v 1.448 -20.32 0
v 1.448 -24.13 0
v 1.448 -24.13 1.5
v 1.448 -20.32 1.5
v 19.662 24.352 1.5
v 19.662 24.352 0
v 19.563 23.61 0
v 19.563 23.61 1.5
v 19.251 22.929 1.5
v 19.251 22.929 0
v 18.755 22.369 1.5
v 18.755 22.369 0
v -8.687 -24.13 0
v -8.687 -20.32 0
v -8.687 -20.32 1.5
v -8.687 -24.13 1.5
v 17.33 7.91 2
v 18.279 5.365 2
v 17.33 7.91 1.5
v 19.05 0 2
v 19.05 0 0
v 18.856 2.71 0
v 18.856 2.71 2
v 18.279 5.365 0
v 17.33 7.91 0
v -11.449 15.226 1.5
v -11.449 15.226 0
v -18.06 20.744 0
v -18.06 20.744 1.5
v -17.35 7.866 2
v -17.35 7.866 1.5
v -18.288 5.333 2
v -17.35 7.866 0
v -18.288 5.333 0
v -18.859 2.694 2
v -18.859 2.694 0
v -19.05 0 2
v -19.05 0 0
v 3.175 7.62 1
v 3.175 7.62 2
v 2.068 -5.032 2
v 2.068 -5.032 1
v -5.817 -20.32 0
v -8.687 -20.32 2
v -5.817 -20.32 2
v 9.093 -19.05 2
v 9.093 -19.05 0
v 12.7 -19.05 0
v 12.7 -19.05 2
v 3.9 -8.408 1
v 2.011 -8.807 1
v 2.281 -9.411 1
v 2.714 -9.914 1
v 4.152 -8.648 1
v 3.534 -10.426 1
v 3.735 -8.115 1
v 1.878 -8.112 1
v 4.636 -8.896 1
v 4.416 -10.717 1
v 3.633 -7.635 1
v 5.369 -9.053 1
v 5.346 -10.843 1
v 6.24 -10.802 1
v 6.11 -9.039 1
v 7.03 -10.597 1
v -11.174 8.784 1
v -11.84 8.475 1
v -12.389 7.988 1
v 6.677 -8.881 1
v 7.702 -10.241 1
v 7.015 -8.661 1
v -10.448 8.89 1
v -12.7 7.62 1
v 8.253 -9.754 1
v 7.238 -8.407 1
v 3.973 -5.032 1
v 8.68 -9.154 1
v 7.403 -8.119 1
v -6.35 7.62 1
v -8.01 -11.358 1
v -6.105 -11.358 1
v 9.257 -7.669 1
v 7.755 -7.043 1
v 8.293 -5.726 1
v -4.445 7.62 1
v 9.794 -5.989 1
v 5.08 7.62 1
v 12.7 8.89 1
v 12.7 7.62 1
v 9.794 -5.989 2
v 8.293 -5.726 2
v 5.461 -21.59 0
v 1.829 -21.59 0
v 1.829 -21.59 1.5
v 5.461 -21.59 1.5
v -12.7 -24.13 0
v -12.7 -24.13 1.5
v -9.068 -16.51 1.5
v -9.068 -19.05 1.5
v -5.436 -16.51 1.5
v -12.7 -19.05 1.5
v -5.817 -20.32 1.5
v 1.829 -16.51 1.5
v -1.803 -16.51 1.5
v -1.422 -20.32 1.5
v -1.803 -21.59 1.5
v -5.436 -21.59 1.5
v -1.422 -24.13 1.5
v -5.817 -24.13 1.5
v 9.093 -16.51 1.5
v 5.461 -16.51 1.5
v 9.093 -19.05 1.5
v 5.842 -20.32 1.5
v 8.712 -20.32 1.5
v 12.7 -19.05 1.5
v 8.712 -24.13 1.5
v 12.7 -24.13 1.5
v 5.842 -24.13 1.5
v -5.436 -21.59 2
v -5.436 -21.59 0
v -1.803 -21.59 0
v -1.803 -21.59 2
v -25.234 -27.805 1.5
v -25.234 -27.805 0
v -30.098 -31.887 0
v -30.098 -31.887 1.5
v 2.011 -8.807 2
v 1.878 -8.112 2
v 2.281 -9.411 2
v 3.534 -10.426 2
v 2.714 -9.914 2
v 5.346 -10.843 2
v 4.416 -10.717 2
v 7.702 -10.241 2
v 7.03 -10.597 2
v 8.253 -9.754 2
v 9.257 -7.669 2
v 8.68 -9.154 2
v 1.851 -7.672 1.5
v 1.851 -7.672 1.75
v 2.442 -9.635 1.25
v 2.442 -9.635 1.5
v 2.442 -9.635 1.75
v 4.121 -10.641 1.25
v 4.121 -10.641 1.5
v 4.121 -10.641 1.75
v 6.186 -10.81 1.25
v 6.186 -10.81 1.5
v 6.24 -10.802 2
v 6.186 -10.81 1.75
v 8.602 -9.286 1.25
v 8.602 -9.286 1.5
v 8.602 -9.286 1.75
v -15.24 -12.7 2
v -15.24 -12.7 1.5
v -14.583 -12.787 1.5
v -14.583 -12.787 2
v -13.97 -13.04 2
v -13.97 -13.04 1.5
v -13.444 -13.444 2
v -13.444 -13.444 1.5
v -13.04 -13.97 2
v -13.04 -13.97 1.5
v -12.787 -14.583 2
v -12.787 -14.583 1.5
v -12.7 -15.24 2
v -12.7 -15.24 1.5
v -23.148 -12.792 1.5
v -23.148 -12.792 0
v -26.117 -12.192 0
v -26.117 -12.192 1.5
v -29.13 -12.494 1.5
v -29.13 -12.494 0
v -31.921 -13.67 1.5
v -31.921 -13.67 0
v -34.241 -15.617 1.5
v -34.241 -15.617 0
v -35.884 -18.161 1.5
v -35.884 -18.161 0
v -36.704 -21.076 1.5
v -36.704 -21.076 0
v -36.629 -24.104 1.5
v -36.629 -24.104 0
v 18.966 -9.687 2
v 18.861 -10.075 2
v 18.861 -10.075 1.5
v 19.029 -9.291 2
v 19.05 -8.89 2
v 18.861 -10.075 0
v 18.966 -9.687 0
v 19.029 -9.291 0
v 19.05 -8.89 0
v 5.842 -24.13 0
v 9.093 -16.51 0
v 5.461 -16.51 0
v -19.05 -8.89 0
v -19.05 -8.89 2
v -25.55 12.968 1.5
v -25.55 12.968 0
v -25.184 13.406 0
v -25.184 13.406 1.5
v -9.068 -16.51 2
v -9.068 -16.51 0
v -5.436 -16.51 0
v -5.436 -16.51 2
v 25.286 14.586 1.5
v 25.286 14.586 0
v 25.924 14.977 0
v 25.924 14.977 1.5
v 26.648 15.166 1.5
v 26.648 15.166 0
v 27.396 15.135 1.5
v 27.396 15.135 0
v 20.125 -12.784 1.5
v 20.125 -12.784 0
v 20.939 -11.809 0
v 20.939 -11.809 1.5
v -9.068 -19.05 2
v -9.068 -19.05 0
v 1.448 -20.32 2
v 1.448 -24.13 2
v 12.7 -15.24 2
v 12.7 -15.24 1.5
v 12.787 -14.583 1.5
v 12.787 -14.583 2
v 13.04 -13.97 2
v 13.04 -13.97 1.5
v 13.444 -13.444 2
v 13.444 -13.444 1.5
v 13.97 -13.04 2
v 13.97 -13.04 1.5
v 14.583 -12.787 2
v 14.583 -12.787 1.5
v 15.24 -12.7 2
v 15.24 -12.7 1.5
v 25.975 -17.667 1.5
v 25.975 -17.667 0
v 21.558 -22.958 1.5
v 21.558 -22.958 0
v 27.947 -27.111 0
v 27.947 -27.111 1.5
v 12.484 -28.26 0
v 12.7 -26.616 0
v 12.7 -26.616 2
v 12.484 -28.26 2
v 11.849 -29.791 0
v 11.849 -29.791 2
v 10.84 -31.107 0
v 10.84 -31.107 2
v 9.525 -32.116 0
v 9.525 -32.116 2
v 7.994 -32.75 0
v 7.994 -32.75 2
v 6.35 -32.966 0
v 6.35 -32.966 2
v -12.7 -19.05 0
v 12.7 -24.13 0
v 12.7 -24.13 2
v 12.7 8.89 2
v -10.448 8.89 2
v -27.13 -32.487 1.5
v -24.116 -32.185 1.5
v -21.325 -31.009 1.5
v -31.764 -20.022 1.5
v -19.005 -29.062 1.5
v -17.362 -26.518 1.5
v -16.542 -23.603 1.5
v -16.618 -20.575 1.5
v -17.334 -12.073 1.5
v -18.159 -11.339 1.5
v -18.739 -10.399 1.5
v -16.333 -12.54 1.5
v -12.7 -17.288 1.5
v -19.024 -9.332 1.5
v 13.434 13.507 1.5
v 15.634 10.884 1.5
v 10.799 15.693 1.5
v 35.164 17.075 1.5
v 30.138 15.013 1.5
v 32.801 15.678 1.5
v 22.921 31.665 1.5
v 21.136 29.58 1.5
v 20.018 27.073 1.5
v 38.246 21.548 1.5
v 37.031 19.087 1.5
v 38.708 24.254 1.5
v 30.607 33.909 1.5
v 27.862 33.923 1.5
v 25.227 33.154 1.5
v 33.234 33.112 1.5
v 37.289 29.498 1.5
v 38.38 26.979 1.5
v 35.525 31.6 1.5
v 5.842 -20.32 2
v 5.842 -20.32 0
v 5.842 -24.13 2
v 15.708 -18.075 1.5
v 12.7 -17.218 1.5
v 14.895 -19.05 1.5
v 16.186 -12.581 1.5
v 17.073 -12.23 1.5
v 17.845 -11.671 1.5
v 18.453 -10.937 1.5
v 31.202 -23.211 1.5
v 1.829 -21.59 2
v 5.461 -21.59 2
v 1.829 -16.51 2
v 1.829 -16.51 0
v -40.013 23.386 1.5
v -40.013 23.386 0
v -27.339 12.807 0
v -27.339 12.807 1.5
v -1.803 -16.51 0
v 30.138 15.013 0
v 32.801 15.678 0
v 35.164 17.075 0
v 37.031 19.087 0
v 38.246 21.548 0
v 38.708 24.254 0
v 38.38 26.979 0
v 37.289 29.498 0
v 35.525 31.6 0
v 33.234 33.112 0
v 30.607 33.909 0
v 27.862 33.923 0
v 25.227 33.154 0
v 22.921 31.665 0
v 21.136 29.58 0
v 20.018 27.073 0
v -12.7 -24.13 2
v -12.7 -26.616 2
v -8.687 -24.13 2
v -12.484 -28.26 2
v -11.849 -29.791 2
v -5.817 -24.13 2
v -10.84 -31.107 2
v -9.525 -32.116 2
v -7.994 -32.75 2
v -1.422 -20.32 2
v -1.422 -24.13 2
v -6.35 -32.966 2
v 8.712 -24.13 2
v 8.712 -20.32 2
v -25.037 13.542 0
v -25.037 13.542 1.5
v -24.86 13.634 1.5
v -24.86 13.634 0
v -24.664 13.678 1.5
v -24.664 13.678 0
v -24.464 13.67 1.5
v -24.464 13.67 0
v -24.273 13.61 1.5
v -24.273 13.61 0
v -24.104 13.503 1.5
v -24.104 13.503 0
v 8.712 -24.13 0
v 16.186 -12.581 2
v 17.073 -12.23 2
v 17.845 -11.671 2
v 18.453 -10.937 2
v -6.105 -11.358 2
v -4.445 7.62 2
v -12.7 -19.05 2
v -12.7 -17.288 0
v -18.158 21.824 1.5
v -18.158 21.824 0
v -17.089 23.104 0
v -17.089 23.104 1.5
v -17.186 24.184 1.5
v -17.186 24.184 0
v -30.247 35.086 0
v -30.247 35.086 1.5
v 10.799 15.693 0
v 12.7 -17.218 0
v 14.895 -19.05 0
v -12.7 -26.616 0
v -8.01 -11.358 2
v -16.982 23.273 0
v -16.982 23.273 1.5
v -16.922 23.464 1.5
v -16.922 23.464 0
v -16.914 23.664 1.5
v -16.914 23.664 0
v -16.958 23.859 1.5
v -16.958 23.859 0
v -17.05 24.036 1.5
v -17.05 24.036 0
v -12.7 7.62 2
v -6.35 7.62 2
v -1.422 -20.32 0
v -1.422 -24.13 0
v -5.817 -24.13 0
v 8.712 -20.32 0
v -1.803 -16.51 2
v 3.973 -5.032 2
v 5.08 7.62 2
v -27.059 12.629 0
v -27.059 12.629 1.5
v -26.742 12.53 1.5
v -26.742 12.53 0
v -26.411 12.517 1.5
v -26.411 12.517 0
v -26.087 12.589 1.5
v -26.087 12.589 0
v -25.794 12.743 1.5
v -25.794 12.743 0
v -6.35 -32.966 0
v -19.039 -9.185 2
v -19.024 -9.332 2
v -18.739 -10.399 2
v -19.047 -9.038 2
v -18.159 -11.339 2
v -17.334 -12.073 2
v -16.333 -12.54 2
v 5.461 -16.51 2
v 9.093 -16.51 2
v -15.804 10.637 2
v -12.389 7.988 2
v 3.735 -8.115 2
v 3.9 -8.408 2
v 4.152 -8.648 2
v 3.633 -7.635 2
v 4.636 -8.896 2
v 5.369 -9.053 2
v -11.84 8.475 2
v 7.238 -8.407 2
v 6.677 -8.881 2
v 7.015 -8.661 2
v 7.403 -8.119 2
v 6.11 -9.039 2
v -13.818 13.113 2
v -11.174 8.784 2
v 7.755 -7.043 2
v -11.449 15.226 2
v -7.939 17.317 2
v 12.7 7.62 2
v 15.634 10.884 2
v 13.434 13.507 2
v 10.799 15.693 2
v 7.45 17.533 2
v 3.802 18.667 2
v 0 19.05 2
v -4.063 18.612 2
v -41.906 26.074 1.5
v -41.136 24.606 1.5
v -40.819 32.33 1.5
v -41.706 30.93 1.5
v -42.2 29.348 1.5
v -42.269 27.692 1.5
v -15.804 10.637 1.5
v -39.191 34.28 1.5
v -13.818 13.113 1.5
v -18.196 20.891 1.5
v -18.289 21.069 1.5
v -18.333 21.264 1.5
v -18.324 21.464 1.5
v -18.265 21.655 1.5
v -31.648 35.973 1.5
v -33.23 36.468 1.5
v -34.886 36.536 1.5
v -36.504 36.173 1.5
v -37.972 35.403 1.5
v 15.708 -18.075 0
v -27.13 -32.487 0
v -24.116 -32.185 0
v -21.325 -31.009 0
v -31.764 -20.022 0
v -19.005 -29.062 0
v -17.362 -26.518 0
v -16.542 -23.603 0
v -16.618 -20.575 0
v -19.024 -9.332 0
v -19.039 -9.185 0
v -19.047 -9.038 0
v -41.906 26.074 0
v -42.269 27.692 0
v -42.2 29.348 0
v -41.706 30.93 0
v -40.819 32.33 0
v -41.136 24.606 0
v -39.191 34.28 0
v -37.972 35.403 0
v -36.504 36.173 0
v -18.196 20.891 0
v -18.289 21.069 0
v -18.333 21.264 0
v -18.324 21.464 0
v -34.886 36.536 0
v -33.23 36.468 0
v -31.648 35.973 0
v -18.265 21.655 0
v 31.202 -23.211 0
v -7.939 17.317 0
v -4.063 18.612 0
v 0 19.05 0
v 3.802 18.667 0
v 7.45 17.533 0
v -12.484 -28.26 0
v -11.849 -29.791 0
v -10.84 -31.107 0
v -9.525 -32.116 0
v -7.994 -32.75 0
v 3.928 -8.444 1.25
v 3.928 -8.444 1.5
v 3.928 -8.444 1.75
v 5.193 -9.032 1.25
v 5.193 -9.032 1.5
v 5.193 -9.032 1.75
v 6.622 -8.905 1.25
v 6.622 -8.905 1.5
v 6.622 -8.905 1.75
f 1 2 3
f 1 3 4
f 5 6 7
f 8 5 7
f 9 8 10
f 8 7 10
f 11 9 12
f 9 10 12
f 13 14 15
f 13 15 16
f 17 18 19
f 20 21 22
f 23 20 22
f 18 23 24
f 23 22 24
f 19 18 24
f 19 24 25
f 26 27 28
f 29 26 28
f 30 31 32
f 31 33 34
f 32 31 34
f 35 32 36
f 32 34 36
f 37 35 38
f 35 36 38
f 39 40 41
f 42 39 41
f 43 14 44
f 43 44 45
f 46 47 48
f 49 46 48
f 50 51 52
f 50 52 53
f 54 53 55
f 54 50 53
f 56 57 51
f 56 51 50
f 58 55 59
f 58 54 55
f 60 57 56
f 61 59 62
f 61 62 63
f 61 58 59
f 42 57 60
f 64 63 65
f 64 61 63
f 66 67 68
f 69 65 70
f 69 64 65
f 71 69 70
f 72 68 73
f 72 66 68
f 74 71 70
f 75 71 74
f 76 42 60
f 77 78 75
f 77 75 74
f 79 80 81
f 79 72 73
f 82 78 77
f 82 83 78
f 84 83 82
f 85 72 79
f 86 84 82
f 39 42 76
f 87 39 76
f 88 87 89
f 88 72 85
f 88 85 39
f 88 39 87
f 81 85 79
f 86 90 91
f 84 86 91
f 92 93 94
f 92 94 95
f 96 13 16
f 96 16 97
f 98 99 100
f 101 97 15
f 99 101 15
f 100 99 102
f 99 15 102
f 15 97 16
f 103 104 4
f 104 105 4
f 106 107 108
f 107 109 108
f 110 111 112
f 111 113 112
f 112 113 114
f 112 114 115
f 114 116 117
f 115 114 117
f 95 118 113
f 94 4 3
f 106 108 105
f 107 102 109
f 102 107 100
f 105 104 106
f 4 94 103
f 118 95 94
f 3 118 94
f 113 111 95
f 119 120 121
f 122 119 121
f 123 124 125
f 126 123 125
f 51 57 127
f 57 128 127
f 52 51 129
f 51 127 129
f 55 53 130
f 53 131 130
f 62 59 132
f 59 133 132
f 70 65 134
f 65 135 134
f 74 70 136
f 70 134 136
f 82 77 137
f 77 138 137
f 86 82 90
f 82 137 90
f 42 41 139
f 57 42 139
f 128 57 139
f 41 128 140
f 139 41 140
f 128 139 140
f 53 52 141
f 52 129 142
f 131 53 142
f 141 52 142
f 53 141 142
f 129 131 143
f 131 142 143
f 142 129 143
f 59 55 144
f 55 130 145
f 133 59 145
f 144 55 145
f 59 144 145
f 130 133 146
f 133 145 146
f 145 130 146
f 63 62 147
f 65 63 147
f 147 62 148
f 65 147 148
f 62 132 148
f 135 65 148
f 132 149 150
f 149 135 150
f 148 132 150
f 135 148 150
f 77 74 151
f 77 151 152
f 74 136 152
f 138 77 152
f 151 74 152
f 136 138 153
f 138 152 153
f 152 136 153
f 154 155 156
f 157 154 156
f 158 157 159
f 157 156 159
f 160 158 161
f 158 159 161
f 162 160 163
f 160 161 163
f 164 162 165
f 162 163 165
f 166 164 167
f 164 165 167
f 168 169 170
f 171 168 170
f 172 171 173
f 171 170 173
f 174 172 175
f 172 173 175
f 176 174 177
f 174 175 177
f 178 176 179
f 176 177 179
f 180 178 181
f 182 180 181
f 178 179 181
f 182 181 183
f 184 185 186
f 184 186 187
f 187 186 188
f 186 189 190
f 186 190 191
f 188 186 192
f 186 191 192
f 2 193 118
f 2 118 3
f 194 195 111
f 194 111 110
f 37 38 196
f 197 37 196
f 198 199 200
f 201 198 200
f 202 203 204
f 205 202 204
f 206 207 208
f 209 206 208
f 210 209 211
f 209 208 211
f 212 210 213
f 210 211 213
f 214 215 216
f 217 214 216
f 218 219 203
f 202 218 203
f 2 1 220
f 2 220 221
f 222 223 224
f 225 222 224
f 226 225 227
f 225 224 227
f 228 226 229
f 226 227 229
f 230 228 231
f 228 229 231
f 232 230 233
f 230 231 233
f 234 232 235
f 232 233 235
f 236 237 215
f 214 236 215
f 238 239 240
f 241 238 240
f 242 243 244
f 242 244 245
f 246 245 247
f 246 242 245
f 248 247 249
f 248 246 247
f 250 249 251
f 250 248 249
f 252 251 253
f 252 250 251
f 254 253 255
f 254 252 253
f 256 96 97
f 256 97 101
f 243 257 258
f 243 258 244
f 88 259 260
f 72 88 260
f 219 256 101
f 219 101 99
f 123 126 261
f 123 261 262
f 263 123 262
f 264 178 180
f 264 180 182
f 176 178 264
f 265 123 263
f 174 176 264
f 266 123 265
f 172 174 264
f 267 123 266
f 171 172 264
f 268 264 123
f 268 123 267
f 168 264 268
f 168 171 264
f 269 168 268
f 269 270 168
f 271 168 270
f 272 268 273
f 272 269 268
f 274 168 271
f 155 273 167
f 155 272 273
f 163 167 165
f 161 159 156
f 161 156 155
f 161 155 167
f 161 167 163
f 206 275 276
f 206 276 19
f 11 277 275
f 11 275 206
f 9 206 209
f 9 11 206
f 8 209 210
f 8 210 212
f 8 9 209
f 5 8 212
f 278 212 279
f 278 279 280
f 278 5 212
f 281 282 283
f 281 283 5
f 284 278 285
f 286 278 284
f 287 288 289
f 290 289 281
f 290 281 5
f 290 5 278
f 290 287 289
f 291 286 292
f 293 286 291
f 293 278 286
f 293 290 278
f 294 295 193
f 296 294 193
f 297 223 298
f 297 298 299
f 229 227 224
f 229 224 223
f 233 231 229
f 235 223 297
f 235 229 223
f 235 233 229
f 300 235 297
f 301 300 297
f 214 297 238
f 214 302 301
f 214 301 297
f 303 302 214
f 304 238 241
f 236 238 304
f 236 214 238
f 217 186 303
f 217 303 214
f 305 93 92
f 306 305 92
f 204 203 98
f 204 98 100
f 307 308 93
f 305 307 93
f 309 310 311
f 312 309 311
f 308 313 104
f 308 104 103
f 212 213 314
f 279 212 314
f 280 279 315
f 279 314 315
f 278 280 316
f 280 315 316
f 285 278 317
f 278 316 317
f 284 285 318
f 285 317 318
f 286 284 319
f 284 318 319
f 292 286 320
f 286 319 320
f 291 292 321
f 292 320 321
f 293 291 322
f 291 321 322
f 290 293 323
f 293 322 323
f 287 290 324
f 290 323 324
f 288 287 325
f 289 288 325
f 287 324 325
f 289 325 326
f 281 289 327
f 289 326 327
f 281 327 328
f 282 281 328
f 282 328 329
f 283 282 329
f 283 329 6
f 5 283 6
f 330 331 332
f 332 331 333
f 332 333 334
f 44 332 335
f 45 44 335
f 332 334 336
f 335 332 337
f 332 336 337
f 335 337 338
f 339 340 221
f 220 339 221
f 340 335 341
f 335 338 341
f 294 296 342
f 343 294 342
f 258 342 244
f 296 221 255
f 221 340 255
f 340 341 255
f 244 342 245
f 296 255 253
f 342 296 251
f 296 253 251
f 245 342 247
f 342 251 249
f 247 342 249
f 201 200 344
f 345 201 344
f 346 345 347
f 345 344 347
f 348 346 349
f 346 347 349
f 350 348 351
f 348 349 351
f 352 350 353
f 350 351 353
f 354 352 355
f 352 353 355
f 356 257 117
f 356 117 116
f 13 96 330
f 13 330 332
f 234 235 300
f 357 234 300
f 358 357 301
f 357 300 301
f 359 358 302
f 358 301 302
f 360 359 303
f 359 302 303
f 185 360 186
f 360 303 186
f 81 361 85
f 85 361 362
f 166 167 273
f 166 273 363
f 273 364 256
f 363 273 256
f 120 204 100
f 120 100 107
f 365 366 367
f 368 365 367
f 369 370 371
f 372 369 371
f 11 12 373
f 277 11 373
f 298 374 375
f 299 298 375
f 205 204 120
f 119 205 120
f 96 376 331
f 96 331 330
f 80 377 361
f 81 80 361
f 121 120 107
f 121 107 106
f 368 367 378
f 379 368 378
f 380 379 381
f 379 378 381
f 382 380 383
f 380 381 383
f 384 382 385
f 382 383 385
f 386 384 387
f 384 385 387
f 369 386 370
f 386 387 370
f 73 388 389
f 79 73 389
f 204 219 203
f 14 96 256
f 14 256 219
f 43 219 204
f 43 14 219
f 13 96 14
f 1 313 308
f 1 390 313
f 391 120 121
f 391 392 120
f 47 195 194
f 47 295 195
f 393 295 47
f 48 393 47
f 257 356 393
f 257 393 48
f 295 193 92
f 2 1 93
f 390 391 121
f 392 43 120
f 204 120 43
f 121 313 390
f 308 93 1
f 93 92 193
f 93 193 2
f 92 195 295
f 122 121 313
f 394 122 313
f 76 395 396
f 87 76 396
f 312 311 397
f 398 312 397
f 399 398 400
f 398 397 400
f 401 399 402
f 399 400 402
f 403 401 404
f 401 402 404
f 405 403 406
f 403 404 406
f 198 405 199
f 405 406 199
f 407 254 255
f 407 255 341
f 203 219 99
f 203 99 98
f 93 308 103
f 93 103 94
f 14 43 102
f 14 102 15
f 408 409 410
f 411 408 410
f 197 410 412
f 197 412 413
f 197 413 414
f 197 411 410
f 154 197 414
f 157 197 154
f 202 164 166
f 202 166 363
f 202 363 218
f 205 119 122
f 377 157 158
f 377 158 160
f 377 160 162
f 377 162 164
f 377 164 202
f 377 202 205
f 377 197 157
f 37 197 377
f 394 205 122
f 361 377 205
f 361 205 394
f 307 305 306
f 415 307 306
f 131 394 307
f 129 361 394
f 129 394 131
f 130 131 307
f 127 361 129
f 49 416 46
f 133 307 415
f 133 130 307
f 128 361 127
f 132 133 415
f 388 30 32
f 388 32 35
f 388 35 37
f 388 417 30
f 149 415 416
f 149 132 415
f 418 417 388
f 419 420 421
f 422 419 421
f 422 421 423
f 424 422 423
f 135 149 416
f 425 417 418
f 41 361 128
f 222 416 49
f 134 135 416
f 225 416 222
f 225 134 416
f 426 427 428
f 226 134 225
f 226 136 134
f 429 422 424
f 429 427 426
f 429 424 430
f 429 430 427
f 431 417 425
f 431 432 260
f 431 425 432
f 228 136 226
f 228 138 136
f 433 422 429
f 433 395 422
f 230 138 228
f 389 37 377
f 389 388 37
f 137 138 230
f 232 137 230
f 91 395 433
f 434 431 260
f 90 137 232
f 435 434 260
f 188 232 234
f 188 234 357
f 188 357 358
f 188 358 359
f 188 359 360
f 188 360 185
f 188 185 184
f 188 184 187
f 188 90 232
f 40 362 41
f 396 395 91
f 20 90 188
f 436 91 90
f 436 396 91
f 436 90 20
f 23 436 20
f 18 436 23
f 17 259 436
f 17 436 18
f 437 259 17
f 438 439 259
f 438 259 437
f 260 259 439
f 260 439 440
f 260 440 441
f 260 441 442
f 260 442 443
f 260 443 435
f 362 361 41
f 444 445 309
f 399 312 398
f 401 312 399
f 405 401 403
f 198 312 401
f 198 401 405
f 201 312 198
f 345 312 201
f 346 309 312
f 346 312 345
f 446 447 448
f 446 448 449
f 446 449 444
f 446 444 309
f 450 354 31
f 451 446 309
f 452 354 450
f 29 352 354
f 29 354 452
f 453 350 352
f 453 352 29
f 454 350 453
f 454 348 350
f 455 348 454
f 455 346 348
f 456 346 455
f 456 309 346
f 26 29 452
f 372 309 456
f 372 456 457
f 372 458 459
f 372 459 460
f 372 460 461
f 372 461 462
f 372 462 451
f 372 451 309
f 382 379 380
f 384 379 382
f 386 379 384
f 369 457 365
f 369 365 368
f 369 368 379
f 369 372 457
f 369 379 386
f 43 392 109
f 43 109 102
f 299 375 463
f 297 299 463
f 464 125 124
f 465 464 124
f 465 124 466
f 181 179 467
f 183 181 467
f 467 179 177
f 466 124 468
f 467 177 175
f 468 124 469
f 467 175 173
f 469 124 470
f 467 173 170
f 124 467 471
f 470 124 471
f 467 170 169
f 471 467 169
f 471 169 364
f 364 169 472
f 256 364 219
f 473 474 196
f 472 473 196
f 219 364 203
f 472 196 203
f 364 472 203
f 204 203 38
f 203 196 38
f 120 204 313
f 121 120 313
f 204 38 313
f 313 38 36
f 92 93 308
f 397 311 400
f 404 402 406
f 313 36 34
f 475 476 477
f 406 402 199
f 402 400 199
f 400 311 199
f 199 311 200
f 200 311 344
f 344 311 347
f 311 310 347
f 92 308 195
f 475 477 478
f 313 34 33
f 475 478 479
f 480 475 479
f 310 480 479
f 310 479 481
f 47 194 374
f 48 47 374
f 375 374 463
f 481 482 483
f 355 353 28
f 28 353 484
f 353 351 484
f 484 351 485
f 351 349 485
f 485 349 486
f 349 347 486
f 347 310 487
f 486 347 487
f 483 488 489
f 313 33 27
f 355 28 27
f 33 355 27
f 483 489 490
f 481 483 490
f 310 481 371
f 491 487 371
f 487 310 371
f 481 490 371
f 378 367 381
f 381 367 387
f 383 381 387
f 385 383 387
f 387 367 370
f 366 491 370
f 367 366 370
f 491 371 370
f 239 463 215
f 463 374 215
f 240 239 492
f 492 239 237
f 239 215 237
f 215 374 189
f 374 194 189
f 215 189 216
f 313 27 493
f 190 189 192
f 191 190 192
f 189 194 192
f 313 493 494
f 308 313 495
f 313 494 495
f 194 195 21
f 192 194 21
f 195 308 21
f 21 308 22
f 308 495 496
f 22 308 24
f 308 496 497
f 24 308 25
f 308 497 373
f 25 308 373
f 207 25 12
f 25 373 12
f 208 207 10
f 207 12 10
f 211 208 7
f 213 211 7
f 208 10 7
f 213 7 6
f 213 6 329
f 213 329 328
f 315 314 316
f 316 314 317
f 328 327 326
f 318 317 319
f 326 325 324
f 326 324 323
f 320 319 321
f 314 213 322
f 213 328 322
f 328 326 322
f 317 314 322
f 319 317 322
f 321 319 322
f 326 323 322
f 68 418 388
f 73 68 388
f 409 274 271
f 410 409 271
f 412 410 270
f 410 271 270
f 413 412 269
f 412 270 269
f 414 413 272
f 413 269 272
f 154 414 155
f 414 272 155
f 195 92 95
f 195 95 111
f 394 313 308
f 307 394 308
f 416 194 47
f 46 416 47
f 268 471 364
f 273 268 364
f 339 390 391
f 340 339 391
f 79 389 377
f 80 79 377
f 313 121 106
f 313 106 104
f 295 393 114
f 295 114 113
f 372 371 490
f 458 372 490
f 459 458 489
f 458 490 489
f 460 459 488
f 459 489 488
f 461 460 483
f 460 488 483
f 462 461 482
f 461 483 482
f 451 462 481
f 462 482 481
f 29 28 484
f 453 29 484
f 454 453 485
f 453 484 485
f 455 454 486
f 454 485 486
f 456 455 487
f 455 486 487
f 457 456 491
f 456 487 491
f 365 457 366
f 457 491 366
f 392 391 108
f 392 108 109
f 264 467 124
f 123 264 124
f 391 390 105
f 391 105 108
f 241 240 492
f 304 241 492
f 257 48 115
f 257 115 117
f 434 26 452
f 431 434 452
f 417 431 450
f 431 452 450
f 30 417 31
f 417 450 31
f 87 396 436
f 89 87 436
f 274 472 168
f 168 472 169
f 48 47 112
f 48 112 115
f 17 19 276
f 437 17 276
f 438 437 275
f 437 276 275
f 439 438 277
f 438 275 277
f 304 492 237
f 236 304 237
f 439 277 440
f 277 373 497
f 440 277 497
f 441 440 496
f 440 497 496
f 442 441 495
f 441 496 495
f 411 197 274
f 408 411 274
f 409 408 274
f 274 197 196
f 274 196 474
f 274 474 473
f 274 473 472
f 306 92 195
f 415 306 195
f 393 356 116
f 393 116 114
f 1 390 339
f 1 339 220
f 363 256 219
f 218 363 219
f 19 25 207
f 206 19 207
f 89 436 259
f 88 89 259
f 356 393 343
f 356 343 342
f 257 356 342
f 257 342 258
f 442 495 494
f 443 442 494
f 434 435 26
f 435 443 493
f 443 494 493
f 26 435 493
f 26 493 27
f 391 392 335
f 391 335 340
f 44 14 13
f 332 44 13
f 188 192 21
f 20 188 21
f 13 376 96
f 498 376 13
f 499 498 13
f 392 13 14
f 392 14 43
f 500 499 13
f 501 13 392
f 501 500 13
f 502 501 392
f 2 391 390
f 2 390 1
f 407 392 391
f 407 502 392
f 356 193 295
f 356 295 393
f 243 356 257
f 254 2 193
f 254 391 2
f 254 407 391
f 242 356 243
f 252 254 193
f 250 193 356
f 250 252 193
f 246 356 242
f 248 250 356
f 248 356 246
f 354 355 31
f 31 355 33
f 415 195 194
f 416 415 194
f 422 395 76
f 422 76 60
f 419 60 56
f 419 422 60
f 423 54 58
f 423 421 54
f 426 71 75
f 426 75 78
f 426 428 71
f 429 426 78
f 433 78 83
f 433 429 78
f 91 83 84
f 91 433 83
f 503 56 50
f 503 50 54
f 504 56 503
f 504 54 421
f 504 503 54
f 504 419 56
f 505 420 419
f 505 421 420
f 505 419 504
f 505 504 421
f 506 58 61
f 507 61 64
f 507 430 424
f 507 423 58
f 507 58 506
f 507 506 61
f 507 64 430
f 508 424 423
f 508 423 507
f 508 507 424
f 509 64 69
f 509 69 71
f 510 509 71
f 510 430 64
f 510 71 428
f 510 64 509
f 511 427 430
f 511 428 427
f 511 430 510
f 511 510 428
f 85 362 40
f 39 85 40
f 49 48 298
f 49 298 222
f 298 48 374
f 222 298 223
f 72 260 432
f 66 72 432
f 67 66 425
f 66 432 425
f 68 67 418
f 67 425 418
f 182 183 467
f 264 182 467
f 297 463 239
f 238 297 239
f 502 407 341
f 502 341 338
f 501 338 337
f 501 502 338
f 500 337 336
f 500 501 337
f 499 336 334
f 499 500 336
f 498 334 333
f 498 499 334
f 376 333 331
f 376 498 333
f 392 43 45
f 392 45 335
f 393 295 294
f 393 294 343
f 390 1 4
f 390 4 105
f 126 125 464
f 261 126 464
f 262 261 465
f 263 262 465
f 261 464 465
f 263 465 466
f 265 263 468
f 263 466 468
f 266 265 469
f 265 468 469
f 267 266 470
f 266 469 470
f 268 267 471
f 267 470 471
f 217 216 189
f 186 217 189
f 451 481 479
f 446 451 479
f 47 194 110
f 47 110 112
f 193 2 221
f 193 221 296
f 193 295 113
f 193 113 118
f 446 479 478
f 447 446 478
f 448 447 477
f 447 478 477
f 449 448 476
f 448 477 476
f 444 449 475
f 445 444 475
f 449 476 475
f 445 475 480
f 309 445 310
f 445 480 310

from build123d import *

# Parameters (mm, degrees)
F1_DEPTH = 2
F2_DEPTH = 1.5
F4_DEPTH = 1
F5_W     = 2.8702
F5_H     = 3.81
F6_DEPTH = 2
F8_DEPTH = 1.5


with BuildPart() as f1:
    # F0 (on Top) → F1 (new body)
    with BuildSketch(Plane.XY):
        with BuildLine():
            ThreePointArc((-17.350378822, 7.865548597), (-18.6202472669, 4.0235421857), (-19.05, 0))
            Line((-19.05, 0), (-19.05, -8.89))
            ThreePointArc((-19.05, -8.89), (-19.0435687847, -9.1112792359), (-19.0242968503, -9.3318114407))
            Line((-19.0242968503, -9.3318114407), (-7.9152189824, -0.010188299))
            Line((-7.9152189824, -0.010188299), (-17.350378822, 7.865548597))
        make_face()
        with BuildLine():
            Line((17.3300726338, 7.9101885255), (7.3486507997, -0.4652188541))
            Line((7.3486507997, -0.4652188541), (18.8610686328, -10.0748890061))
            ThreePointArc((18.8610686328, -10.0748890061), (19.002470697, -9.4899285412), (19.05, -8.89))
            Line((19.05, -8.89), (19.05, 0))
            ThreePointArc((19.05, 0), (18.6150528293, 4.047506413), (17.3300726338, 7.9101885255))
        make_face()
        with BuildLine():
            ThreePointArc((0, 19.05), (-6.0354590928, 18.0686395044), (-11.4490849965, 15.2256675631))
            Line((-11.4490849965, 15.2256675631), (-0.575094857, 6.1489071474))
            Line((-0.575094857, 6.1489071474), (10.7993505194, 15.6932000676))
            ThreePointArc((10.7993505194, 15.6932000676), (5.6545131848, 18.1914535055), (0, 19.05))
        make_face()
        Polygon((12.7, -17.2181681869), (0.0085266744, -6.6243143005), (-12.7, -17.2880343458), (-12.7, -19.05), (-9.0678, -19.05), (-9.0678, -16.51), (-5.4356, -16.51), (-5.4356, -21.59), (-1.8034, -21.59), (-1.8034, -16.51), (1.8288, -16.51), (1.8288, -21.59), (5.461, -21.59), (5.461, -16.51), (9.0932, -16.51), (9.0932, -19.05), (12.7, -19.05), align=None)
        with BuildLine():
            ThreePointArc((-11.4490849965, 15.2256675631), (-14.8625407268, 11.9166850736), (-17.350378822, 7.865548597))
            Line((-17.350378822, 7.865548597), (-7.9152189824, -0.010188299))
            Line((-7.9152189824, -0.010188299), (-0.575094857, 6.1489071474))
            Line((-0.575094857, 6.1489071474), (-11.4490849965, 15.2256675631))
        make_face()
        with BuildLine():
            Line((10.7993505194, 15.6932000676), (-0.575094857, 6.1489071474))
            Line((-0.575094857, 6.1489071474), (7.3486507997, -0.4652188541))
            Line((7.3486507997, -0.4652188541), (17.3300726338, 7.9101885255))
            ThreePointArc((17.3300726338, 7.9101885255), (14.5931466414, 12.2451039645), (10.7993505194, 15.6932000676))
        make_face()
        with BuildLine():
            Line((-7.9152189824, -0.010188299), (-19.0242968503, -9.3318114407))
            ThreePointArc((-19.0242968503, -9.3318114407), (-17.7730612321, -11.7359973286), (-15.24, -12.7))
            ThreePointArc((-15.24, -12.7), (-13.4439487758, -13.4439487758), (-12.7, -15.24))
            Line((-12.7, -15.24), (-12.7, -17.2880343458))
            Line((-12.7, -17.2880343458), (0.0085266744, -6.6243143005))
            Line((0.0085266744, -6.6243143005), (-7.9152189824, -0.010188299))
        make_face()
        with BuildLine():
            Line((7.3486507997, -0.4652188541), (0.0085266744, -6.6243143005))
            Line((0.0085266744, -6.6243143005), (12.7, -17.2181681869))
            Line((12.7, -17.2181681869), (12.7, -15.24))
            ThreePointArc((12.7, -15.24), (13.4439487758, -13.4439487758), (15.24, -12.7))
            ThreePointArc((15.24, -12.7), (17.4762550041, -11.9746820836), (18.8610686328, -10.0748890061))
            Line((18.8610686328, -10.0748890061), (7.3486507997, -0.4652188541))
        make_face()
        Polygon((-0.575094857, 6.1489071474), (-7.9152189824, -0.010188299), (0.0085266744, -6.6243143005), (7.3486507997, -0.4652188541), align=None)
    extrude(amount=F1_DEPTH)

    # F0 (on Top) → F2 (join)
    with BuildSketch(Plane.XY):
        Polygon((20.1248387317, -12.7840851229), (15.7083738332, -18.0750252334), (21.5582224331, -22.958023427), (27.9471431324, -27.1108648998), (31.2024752615, -23.2109658333), (25.9746873315, -17.6670833165), align=None)
        with BuildLine():
            Line((18.7552497683, 22.3689921931), (10.7993505194, 15.6932000676))
            ThreePointArc((10.7993505194, 15.6932000676), (14.5931466414, 12.2451039645), (17.3300726338, 7.9101885255))
            Line((17.3300726338, 7.9101885255), (25.2859718828, 14.585980651))
            ThreePointArc((25.2859718828, 14.585980651), (26.2791103213, 15.0983949516), (27.3960504896, 15.1349604315))
            ThreePointArc((27.3960504896, 15.1349604315), (36.4828666035, 30.6127599113), (19.6623006172, 24.351684626))
            ThreePointArc((19.6623006172, 24.351684626), (19.4323360244, 23.2580628177), (18.7552497683, 22.3689921931))
        make_face()
        with BuildLine():
            Line((-24.1044498645, 13.503321291), (-17.350378822, 7.865548597))
            ThreePointArc((-17.350378822, 7.865548597), (-14.8625407268, 11.9166850736), (-11.4490849965, 15.2256675631))
            Line((-11.4490849965, 15.2256675631), (-18.0603189015, 20.7442109348))
            ThreePointArc((-18.0603189015, 20.7442109348), (-18.3325134958, 21.2638215274), (-18.1575639657, 21.8237123444))
            Line((-18.1575639657, 21.8237123444), (-17.0887919872, 23.1041048439))
            ThreePointArc((-17.0887919872, 23.1041048439), (-16.9138424571, 23.663995661), (-17.1860370515, 24.1836062535))
            Line((-17.1860370515, 24.1836062535), (-30.2473105474, 35.0861405327))
            ThreePointArc((-30.2473105474, 35.0861405327), (-34.8861977743, 36.5356573238), (-39.191349542, 34.2804318609))
            Line((-39.191349542, 34.2804318609), (-40.8190156065, 32.3304823277))
            ThreePointArc((-40.8190156065, 32.3304823277), (-42.2685323976, 27.6915951008), (-40.0133069347, 23.3864433331))
            Line((-40.0133069347, 23.3864433331), (-27.3386349685, 12.8066139135))
            ThreePointArc((-27.3386349685, 12.8066139135), (-26.4108575231, 12.5167105553), (-25.5498271696, 12.9677556479))
            Line((-25.5498271696, 12.9677556479), (-25.1839512741, 13.4060762268))
            ThreePointArc((-25.1839512741, 13.4060762268), (-24.6643406815, 13.6782708211), (-24.1044498645, 13.503321291))
        make_face()
        with BuildLine():
            ThreePointArc((-15.24, -12.7), (-17.7730612321, -11.7359973286), (-19.0242968503, -9.3318114407))
            Line((-19.0242968503, -9.3318114407), (-23.1482866563, -12.7922497659))
            Line((-23.1482866563, -12.7922497659), (-31.7644758693, -20.0220909567))
            Line((-31.7644758693, -20.0220909567), (-25.2337537549, -27.8051024988))
            Line((-25.2337537549, -27.8051024988), (-16.6175645419, -20.575261308))
            Line((-16.6175645419, -20.575261308), (-12.7, -17.2880343458))
            Line((-12.7, -17.2880343458), (-12.7, -15.24))
            ThreePointArc((-12.7, -15.24), (-13.4439487758, -13.4439487758), (-15.24, -12.7))
        make_face()
        with BuildLine():
            Line((-16.6175645419, -20.575261308), (-25.2337537549, -27.8051024988))
            Line((-25.2337537549, -27.8051024988), (-30.0981359687, -31.8868038203))
            ThreePointArc((-30.0981359687, -31.8868038203), (-20.0924891981, -30.1225383352), (-16.6175645419, -20.575261308))
        make_face()
        with BuildLine():
            Line((-31.7644758693, -20.0220909567), (-23.1482866563, -12.7922497659))
            ThreePointArc((-23.1482866563, -12.7922497659), (-33.1539334269, -14.556515251), (-36.6288580831, -24.1037922782))
            Line((-36.6288580831, -24.1037922782), (-31.7644758693, -20.0220909567))
        make_face()
        with BuildLine():
            Line((12.7, -15.24), (12.7, -17.2181681869))
            Line((12.7, -17.2181681869), (14.894540801, -19.05))
            Line((14.894540801, -19.05), (15.7083738332, -18.0750252334))
            Line((15.7083738332, -18.0750252334), (20.1248387317, -12.7840851229))
            Line((20.1248387317, -12.7840851229), (20.938671764, -11.8091103562))
            Line((20.938671764, -11.8091103562), (18.8610686328, -10.0748890061))
            ThreePointArc((18.8610686328, -10.0748890061), (17.4762550041, -11.9746820836), (15.24, -12.7))
            ThreePointArc((15.24, -12.7), (13.4439487758, -13.4439487758), (12.7, -15.24))
        make_face()
    extrude(amount=F2_DEPTH)

    # F3 (on face) → F4 (cut)
    with BuildSketch(Plane.XY.offset(2)):
        with BuildLine():
            Line((12.7, 8.89), (-10.4481822536, 8.89))
            ThreePointArc((-10.4481822536, 8.89), (-11.5184231136, 8.6535156829), (-12.3893764312, 7.9880980327))
            Line((-12.3893764312, 7.9880980327), (-12.7, 7.62))
            Line((-12.7, 7.62), (-6.35, 7.62))
            Line((-6.35, 7.62), (-8.0103168993, -11.3575089986))
            Line((-8.0103168993, -11.3575089986), (-6.1053168993, -11.3575089986))
            Line((-6.1053168993, -11.3575089986), (-4.445, 7.62))
            Line((-4.445, 7.62), (3.175, 7.62))
            Line((3.175, 7.62), (2.0681220671, -5.0316726658))
            add(Edge.make_bspline(
                [(2.0681220671, -5.0316726658), (1.8304261093, -6.956908444), (1.3925031709, -10.1392600556), (6.3314754855, -11.3272816981), (9.0033069328, -9.4686784473), (9.3289021809, -7.1893715816), (9.7937943782, -5.9887018198)],
                knots=[0, 0, 0, 0, 0.2793829209, 0.5368902178, 0.7566094182, 1, 1, 1, 1], degree=3))
            Line((9.7937943782, -5.9887018198), (8.292642422, -5.7257972658))
            add(Edge.make_bspline(
                [(3.9731220671, -5.0316726658), (3.778757999, -6.3917031803), (2.9157932186, -8.9272441493), (6.9047718659, -9.3253261705), (7.6644494392, -7.5986876784), (7.8427474677, -6.5614490151), (8.292642422, -5.7257972658)],
                knots=[0, 0, 0, 0, 0.2985127985, 0.5656746563, 0.7663024976, 1, 1, 1, 1], degree=3))
            Line((3.9731220671, -5.0316726658), (5.08, 7.62))
            Line((5.08, 7.62), (12.7, 7.62))
            Line((12.7, 7.62), (12.7, 8.89))
        make_face()
    extrude(amount=-F4_DEPTH, mode=Mode.SUBTRACT)


with BuildPart() as f6:
    # F5 (on face) → F6 (new body)
    with BuildSketch(Plane(origin=(0, 0, 0), x_dir=(1, 0, 0), z_dir=(0, 0, -1))):
        with BuildLine():
            ThreePointArc((12.7, 26.6164491925), (10.8401280605, 31.1065772531), (6.35, 32.9664491925))
            Line((6.35, 32.9664491925), (-6.35, 32.9664491925))
            ThreePointArc((-6.35, 32.9664491925), (-10.8401280605, 31.1065772531), (-12.7, 26.6164491925))
            Line((-12.7, 26.6164491925), (-12.7, 24.13))
            Line((-12.7, 24.13), (-8.6868, 24.13))
            Line((-8.6868, 24.13), (-5.8166, 24.13))
            Line((-5.8166, 24.13), (-1.4224, 24.13))
            Line((-1.4224, 24.13), (1.4478, 24.13))
            Line((1.4478, 24.13), (5.842, 24.13))
            Line((5.842, 24.13), (8.7122, 24.13))
            Line((8.7122, 24.13), (12.7, 24.13))
            Line((12.7, 24.13), (12.7, 26.6164491925))
        make_face()
        with Locations((7.2771, 22.225)):
            Rectangle(F5_W, F5_H)
        with Locations((-7.2517, 22.225)):
            Rectangle(F5_W, F5_H)
        with Locations((0.0127, 22.225)):
            Rectangle(F5_W, F5_H)
    extrude(amount=-F6_DEPTH)


with BuildPart() as f8:
    # F7 (on face) → F8 (new body)
    with BuildSketch(Plane(origin=(0, 0, 0), x_dir=(1, 0, 0), z_dir=(0, 0, -1))):
        Polygon((9.0932, 19.05), (12.7, 19.05), (12.7, 24.13), (8.7122, 24.13), (8.7122, 20.32), (5.842, 20.32), (5.842, 24.13), (1.4478, 24.13), (1.4478, 20.32), (-1.4224, 20.32), (-1.4224, 24.13), (-5.8166, 24.13), (-5.8166, 20.32), (-8.6868, 20.32), (-8.6868, 24.13), (-12.7, 24.13), (-12.7, 19.05), (-9.0678, 19.05), (-9.0678, 16.51), (-5.4356, 16.51), (-5.4356, 21.59), (-1.8034, 21.59), (-1.8034, 16.51), (1.8288, 16.51), (1.8288, 21.59), (5.461, 21.59), (5.461, 16.51), (9.0932, 16.51), align=None)
    extrude(amount=-F8_DEPTH)


solid = Compound([f1.part, f6.part, f8.part])
